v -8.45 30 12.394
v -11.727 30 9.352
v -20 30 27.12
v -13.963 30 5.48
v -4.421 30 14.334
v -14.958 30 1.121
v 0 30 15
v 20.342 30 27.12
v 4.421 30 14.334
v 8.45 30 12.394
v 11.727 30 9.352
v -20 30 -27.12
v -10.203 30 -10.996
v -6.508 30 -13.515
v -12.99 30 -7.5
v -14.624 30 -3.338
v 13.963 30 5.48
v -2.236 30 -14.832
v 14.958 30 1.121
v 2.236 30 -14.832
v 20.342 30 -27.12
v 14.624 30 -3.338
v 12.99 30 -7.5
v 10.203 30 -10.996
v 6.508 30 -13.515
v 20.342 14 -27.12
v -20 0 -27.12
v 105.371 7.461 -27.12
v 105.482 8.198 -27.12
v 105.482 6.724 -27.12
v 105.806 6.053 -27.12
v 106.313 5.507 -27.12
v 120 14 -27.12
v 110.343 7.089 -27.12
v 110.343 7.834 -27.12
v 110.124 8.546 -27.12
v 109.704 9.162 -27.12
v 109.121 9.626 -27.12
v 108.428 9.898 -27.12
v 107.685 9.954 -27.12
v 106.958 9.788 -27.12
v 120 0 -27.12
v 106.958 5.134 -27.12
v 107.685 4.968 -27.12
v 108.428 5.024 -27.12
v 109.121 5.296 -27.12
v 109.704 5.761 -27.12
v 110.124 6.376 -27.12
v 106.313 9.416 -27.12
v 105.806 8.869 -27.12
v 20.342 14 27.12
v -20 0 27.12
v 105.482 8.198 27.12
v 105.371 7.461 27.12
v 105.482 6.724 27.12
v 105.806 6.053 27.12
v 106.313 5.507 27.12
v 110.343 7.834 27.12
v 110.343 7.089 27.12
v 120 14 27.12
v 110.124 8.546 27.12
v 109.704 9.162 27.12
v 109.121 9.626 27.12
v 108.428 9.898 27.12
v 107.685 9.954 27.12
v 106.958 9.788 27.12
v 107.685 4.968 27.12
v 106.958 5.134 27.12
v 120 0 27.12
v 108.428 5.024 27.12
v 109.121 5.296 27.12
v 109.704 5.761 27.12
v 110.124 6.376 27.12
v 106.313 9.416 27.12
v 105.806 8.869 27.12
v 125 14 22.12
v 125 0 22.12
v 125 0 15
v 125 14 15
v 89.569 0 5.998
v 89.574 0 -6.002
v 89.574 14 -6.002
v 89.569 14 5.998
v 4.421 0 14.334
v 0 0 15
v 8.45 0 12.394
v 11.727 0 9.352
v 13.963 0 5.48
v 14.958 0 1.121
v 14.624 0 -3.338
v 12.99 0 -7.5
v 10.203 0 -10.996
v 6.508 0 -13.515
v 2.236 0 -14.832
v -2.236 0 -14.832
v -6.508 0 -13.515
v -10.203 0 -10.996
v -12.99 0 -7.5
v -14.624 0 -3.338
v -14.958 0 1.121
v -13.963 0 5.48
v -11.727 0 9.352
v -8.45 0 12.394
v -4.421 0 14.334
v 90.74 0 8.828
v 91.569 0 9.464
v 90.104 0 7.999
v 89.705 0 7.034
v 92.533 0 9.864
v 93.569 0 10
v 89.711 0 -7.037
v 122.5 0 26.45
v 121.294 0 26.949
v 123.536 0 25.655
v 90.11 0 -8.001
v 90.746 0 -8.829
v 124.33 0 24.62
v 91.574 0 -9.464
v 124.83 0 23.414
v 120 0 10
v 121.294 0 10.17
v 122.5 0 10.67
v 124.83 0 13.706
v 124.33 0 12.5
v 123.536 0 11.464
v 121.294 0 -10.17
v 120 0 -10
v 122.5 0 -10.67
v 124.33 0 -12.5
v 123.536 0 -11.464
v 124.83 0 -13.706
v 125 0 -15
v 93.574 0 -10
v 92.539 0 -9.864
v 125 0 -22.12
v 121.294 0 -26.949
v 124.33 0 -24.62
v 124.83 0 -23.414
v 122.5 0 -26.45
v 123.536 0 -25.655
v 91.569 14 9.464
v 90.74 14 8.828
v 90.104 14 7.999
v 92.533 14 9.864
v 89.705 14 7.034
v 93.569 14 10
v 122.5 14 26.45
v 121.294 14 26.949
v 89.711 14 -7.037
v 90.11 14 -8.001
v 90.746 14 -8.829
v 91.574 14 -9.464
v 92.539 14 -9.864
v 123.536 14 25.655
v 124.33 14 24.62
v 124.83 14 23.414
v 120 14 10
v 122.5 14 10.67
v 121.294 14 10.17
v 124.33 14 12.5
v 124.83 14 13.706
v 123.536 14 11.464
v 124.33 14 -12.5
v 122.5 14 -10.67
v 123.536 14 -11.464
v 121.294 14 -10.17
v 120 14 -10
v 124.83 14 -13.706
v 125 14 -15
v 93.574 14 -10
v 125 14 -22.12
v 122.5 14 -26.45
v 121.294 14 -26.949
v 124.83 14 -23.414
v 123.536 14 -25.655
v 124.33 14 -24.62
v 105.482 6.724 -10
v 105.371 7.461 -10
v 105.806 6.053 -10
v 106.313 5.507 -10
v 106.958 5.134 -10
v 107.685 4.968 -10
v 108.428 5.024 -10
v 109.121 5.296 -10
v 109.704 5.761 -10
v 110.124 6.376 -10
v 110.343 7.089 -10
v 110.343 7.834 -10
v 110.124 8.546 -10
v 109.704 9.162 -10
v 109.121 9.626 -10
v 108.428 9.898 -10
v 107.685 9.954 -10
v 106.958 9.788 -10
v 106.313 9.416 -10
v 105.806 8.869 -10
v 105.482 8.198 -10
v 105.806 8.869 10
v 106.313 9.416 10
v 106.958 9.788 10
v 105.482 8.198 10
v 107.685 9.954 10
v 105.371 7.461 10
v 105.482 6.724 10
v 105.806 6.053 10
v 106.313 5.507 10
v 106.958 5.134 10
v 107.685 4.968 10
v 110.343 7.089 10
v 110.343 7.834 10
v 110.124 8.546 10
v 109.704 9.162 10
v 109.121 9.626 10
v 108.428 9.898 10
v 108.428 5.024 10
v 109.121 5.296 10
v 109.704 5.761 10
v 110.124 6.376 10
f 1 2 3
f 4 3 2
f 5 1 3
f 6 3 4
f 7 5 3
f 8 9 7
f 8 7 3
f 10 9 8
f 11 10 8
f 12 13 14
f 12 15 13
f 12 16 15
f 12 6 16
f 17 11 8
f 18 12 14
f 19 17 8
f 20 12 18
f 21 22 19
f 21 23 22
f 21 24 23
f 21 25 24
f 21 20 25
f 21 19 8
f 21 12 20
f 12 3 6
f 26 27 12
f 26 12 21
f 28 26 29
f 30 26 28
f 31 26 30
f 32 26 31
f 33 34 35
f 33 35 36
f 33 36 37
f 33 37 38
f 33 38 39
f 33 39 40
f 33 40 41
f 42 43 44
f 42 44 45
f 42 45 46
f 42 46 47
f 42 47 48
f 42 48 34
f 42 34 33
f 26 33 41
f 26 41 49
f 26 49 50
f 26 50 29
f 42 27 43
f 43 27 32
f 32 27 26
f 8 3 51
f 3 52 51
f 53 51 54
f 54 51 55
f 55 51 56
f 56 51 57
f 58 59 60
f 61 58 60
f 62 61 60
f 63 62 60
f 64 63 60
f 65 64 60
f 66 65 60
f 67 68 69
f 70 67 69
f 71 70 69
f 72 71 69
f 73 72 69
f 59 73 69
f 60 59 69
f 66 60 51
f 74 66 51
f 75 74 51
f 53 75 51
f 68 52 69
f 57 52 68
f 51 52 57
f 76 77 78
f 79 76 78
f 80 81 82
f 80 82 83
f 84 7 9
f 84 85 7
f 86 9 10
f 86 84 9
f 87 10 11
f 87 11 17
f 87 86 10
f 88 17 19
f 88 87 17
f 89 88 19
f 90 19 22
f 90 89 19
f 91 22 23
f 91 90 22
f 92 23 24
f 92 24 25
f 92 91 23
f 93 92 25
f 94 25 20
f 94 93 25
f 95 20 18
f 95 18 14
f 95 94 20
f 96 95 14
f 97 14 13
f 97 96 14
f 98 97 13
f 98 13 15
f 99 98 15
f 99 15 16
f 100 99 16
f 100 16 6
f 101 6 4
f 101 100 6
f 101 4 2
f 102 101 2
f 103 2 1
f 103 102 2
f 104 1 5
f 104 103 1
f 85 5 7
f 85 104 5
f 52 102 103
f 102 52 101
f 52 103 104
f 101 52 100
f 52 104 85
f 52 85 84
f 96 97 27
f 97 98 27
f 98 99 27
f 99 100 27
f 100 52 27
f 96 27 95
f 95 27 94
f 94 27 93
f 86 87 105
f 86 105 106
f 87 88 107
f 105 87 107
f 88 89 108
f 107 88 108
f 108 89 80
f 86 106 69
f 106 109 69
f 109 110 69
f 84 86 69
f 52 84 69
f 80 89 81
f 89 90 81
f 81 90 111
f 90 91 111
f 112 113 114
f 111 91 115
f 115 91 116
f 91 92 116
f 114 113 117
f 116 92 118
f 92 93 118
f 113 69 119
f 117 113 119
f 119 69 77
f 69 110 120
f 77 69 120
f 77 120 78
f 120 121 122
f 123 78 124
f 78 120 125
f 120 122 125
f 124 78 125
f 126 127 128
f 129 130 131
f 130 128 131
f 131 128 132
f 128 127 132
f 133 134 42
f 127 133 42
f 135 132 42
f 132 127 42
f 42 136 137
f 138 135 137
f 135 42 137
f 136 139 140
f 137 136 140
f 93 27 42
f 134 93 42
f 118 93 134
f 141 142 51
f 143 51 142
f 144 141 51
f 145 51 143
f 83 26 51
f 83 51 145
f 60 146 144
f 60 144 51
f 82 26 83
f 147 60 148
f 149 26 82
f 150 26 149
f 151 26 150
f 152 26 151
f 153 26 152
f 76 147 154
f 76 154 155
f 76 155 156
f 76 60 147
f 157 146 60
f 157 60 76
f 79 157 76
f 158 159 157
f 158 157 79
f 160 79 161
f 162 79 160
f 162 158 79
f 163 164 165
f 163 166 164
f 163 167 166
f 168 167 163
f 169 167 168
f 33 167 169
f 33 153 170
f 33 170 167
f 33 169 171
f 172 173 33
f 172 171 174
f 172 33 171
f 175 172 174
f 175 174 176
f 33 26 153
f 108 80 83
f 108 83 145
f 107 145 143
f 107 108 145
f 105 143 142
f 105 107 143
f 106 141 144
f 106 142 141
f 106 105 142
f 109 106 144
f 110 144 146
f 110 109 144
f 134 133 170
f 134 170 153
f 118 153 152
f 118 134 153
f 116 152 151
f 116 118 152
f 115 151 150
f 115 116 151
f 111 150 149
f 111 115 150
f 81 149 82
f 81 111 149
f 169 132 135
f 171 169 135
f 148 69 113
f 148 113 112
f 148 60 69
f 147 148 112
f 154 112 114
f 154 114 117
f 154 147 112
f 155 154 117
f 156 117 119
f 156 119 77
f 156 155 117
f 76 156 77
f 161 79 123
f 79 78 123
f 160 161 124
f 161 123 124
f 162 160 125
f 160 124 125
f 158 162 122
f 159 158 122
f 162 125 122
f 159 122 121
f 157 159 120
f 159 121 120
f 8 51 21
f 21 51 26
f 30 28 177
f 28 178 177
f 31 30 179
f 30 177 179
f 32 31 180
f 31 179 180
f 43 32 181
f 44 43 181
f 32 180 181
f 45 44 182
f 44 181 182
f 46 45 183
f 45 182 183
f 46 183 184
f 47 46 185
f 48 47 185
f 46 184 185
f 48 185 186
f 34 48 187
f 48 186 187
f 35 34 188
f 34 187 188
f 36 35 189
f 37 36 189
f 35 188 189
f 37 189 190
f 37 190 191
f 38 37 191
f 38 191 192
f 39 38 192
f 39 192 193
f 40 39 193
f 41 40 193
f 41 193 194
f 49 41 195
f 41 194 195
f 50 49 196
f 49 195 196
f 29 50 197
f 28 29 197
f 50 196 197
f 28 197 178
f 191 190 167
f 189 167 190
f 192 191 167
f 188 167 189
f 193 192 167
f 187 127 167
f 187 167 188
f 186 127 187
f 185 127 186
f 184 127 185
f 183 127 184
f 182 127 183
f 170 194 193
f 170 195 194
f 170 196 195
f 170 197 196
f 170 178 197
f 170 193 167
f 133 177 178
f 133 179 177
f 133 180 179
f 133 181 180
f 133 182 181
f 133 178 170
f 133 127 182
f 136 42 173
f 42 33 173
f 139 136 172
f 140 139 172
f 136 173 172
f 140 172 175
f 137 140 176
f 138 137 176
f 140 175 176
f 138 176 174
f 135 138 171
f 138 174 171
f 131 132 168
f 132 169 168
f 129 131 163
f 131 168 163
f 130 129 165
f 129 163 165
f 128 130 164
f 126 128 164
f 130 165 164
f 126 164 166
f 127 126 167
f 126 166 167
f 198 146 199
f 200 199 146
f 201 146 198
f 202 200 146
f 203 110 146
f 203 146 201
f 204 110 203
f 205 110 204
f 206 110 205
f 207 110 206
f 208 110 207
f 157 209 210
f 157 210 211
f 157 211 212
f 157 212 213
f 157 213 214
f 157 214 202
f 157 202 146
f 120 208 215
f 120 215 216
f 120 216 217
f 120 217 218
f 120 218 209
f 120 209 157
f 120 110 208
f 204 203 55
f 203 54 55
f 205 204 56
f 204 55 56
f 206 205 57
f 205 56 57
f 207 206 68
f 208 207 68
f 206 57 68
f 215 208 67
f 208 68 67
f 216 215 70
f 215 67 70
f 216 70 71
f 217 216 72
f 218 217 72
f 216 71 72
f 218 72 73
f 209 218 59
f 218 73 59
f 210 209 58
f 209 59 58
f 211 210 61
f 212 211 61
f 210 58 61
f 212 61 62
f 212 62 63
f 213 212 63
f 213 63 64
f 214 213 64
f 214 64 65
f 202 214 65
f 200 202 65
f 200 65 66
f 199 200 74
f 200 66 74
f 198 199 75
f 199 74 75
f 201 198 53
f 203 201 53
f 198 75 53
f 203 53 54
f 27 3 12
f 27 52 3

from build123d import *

# Parameters (mm, degrees)
SKETCH_1_W          = 145
SKETCH_1_H          = 54.239140964
SKETCH_1_R          = 15
EXTRUDE_1_DEPTH     = 14
CUT_EXTRUDE_1_DEPTH = 50
FILLET_2_R          = 5
SKETCH_3_R          = 2.5
CUT_EXTRUDE_2_DEPTH = 36
SKETCH_4_W          = 40.34248958
SKETCH_4_H          = 54.239140964
SKETCH_4_R          = 15
EXTRUDE_2_DEPTH     = 16


with BuildPart() as part:
    # Эскиз1 → Вытянуть1 (new body)
    with BuildSketch(Plane(origin=(0, 0, 0), x_dir=(1, 0, 0), z_dir=(0, 1, 0))):
        with Locations((52.5, 0)):
            Rectangle(SKETCH_1_W, SKETCH_1_H)
        with Locations(Location((0, 0, 0), (0, 0, 270))):
            Circle(SKETCH_1_R, mode=Mode.SUBTRACT)
    extrude(amount=EXTRUDE_1_DEPTH)

    # Эскиз2 → Вырез-Вытянуть1 (cut)
    with BuildSketch(Plane(origin=(0, 0, 0), x_dir=(1, 0, 0), z_dir=(0, 1, 0))):
        with BuildLine():
            Line((93.569014329, -10), (130.542559867, -10))
            Line((130.542559867, -10), (130.542559867, 10))
            Line((130.542559867, 10), (93.573862666, 10))
            ThreePointArc((93.573862666, 10), (90.74600698, 8.828998449), (89.573862992, 6.001616112))
            Line((89.573862992, 6.001616112), (89.569014656, -5.998383888))
            ThreePointArc((89.569014656, -5.998383888), (90.74001588, -8.827855685), (93.569014329, -10))
        make_face()
    extrude(amount=CUT_EXTRUDE_1_DEPTH, mode=Mode.SUBTRACT)

    # Скругление2
    fillet_2_edges = [part.edges().sort_by_distance(p)[0] for p in [
        (125, 7, 10),
        (125, 7, -10),
        (125, 7, 27.119570482),
        (125, 7, -27.119570482),
    ]]
    fillet(fillet_2_edges, radius=FILLET_2_R)

    # Эскиз3 → Вырез-Вытянуть2 (cut, symmetric)
    with BuildSketch(Plane.XY):
        with Locations(Location((107.871367235, 7.461129595, 0), (0, 0, 180))):
            Circle(SKETCH_3_R)
    extrude(amount=CUT_EXTRUDE_2_DEPTH, both=True, mode=Mode.SUBTRACT)

    # Эскиз4 → Вытянуть2 (add)
    with BuildSketch(Plane(origin=(0, 14, 0), x_dir=(1, 0, 0), z_dir=(0, 1, 0))):
        with Locations((0.17124479, 0)):
            Rectangle(SKETCH_4_W, SKETCH_4_H)
        with Locations(Location((0, 0, 0), (0, 0, 270))):
            Circle(SKETCH_4_R, mode=Mode.SUBTRACT)
    extrude(amount=EXTRUDE_2_DEPTH)


solid = part.part
